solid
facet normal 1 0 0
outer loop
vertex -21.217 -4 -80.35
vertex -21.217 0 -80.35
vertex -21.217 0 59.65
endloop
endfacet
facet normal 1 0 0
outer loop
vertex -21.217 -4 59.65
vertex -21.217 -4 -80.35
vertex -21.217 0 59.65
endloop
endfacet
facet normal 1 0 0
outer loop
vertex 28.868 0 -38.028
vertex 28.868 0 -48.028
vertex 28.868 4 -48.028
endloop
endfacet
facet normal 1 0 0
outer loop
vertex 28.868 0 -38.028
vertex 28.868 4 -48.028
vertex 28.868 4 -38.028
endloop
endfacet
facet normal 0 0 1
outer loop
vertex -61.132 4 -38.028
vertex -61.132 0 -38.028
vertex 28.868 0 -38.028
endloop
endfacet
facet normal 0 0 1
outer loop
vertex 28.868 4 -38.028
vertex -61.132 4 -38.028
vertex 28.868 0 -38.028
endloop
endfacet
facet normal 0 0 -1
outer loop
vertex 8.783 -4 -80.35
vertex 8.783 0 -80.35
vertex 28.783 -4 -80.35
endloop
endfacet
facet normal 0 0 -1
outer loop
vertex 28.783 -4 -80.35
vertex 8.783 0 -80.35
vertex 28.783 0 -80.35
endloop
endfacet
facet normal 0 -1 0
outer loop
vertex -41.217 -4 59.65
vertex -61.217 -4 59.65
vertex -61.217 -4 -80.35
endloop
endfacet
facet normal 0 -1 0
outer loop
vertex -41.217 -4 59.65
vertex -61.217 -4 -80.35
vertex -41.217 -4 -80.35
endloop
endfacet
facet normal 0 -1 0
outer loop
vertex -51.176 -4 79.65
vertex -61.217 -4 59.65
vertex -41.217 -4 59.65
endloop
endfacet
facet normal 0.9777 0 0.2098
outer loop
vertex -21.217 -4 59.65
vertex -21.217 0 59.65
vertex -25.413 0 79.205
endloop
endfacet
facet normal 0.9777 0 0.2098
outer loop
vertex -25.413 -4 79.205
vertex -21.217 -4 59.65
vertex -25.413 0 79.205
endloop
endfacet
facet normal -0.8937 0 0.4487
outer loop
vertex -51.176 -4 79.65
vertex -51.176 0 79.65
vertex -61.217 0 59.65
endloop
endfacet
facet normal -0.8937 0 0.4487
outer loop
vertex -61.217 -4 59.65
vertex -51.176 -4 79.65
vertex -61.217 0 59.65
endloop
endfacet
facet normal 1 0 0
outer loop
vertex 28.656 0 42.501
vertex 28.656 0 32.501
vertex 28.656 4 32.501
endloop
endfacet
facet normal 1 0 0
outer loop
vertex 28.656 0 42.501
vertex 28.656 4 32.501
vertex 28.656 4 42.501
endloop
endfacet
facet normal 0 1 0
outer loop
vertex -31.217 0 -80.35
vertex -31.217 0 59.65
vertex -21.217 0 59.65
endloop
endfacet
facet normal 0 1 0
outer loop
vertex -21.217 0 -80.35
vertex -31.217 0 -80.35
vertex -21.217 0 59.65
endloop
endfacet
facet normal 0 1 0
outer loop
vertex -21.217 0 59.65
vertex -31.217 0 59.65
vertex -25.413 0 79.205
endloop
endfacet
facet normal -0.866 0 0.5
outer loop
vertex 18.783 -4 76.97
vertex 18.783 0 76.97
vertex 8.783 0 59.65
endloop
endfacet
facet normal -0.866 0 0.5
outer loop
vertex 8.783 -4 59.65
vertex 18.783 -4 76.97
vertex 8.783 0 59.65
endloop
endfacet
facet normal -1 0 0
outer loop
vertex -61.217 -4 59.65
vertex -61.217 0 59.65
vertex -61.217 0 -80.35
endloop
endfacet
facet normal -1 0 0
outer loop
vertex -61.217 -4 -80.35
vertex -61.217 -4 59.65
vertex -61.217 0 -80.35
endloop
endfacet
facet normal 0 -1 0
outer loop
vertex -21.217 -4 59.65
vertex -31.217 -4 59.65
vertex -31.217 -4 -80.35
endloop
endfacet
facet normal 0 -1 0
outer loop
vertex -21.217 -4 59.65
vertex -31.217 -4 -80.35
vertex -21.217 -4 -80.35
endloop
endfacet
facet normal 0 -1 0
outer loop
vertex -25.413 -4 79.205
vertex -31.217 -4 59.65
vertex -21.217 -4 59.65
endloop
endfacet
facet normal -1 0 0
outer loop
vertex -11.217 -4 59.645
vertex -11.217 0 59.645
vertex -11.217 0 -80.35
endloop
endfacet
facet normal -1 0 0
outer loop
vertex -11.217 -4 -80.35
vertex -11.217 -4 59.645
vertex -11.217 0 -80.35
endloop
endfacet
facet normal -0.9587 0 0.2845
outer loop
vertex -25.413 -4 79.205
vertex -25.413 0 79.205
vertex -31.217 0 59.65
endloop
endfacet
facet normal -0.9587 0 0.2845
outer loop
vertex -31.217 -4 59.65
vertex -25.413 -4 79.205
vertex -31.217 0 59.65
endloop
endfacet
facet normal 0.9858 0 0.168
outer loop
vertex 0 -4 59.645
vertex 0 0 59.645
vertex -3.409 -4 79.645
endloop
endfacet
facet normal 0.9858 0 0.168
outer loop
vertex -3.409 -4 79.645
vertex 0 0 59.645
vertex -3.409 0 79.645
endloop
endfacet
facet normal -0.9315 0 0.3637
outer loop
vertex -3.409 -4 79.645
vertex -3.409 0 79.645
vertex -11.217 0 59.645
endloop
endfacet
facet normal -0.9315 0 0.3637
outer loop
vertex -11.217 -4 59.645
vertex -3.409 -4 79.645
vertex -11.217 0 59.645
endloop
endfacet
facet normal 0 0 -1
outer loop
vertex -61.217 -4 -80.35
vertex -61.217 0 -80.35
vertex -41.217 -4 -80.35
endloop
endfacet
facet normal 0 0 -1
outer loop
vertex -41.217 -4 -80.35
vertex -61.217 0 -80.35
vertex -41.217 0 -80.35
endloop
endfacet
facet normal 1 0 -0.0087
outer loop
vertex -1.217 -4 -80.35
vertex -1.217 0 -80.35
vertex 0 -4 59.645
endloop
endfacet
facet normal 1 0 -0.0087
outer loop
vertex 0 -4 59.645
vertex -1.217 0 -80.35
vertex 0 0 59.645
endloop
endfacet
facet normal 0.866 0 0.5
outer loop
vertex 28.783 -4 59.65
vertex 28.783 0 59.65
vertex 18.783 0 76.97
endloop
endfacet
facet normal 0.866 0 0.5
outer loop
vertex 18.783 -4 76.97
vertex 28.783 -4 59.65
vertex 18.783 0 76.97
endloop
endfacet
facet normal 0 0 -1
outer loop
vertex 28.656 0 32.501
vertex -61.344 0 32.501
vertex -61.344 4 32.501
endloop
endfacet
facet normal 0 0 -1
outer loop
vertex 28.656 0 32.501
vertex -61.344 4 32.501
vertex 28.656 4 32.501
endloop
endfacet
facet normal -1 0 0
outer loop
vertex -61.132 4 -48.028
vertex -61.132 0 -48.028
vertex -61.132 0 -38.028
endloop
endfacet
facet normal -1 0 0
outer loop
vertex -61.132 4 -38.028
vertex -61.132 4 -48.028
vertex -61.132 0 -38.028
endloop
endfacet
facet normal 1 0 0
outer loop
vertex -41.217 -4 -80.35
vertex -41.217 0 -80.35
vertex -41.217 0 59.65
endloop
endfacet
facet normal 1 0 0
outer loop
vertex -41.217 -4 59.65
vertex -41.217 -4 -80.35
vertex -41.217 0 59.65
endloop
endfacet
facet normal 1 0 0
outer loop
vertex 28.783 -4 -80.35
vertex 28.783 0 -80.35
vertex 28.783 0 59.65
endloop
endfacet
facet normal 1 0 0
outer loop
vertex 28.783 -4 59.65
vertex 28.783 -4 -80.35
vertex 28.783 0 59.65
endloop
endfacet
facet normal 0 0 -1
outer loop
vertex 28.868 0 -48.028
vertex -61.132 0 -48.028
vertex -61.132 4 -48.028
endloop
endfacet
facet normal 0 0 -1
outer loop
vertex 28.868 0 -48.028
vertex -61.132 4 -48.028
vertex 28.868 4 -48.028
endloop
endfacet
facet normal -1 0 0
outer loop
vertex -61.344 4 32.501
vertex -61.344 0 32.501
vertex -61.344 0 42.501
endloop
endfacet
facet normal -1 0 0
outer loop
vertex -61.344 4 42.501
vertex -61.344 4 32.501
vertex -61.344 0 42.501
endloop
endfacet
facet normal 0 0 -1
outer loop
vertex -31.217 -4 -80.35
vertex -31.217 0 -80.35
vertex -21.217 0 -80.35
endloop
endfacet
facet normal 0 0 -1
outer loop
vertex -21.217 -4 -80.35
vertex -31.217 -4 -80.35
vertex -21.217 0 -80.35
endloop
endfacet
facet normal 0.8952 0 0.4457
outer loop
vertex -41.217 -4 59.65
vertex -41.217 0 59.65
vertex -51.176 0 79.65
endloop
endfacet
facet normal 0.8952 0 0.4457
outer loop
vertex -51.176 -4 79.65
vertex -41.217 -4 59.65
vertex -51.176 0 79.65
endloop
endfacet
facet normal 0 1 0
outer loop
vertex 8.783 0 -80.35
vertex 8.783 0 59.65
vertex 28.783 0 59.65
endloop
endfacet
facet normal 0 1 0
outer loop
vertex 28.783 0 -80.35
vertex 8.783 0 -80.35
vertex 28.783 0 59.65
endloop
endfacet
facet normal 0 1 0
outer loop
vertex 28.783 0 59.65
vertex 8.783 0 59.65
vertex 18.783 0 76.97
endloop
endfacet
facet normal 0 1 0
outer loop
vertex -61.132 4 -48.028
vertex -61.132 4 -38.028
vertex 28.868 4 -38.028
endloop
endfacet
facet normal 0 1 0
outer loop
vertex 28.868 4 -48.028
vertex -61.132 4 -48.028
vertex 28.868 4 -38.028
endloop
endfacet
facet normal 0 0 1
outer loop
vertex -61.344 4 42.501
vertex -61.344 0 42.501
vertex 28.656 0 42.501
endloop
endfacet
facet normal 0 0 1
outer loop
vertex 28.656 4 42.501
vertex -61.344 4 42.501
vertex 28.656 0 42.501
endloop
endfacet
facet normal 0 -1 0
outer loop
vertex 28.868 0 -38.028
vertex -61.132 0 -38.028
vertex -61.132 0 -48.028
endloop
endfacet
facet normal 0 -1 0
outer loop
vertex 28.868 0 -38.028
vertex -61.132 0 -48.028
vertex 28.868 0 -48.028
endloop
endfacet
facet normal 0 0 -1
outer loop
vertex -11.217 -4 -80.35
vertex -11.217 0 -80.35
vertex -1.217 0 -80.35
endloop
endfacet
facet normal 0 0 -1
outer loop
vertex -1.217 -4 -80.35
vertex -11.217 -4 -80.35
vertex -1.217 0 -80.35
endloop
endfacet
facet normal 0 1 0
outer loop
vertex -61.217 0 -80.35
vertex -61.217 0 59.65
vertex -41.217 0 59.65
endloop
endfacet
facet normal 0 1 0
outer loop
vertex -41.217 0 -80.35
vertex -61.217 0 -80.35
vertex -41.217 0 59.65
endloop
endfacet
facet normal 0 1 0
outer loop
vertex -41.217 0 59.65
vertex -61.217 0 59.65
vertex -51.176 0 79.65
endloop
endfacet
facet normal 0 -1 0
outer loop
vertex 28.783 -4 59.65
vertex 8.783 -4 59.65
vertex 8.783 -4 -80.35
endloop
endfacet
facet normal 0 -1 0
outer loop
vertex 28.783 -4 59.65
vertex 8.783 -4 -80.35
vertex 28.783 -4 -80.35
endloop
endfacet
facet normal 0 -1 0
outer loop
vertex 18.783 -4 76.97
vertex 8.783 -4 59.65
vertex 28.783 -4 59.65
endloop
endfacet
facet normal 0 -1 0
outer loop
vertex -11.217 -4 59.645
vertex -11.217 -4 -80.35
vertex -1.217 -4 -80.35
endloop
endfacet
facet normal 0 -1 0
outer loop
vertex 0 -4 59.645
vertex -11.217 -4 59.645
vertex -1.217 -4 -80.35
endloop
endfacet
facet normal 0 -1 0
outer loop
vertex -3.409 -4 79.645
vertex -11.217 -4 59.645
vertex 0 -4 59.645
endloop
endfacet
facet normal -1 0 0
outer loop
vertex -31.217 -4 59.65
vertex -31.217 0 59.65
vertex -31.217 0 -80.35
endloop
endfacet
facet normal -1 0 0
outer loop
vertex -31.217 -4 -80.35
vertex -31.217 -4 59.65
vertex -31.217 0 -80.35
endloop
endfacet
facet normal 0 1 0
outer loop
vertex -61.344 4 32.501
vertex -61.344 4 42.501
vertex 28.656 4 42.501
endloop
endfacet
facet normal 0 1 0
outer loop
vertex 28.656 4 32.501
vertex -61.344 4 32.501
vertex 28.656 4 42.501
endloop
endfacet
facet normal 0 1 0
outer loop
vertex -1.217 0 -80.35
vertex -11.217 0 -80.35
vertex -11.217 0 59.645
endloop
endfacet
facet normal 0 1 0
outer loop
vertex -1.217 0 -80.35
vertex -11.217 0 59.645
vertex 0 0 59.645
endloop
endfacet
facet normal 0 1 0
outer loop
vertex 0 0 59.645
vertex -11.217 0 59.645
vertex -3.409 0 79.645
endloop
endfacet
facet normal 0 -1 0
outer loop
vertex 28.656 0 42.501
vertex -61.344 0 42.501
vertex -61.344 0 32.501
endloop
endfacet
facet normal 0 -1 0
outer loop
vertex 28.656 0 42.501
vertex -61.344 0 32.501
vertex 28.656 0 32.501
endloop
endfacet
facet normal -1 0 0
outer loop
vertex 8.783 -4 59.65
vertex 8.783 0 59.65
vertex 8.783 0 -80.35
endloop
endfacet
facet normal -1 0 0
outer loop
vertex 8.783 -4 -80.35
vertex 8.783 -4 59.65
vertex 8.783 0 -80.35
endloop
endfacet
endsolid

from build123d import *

# Parameters (mm, degrees)
F1_DEPTH = 4
F2_W     = 90
F2_H     = 10
F3_DEPTH = 4
F4_W     = 90
F4_H     = 10
F5_DEPTH = 4


with BuildPart() as f1:
    # F0 (on Front) → F1 (new body)
    with BuildSketch(Plane.XZ):
        Polygon((8.782633, 59.649963), (8.782633, -80.350037), (28.782633, -80.350037), (28.782633, 59.649963), (18.782633, 59.649963), align=None)
        Polygon((-11.217367, 59.64467), (-11.217367, -80.350037), (-1.217367, -80.350037), (0, 59.64467), (-5.608683, 59.64467), align=None)
        Polygon((-51.175786, 59.649963), (-61.217367, 59.649963), (-61.217367, -80.350037), (-41.217367, -80.350037), (-41.217367, 59.649963), align=None)
        Polygon((-31.217367, 59.649963), (-31.217367, -80.350037), (-21.217367, -80.350037), (-21.217367, 59.649963), (-26.200101, 59.649963), align=None)
        Polygon((18.782633, 59.649963), (28.782633, 59.649963), (18.782633, 76.970471), align=None)
        Polygon((18.782633, 76.970471), (8.782633, 59.649963), (18.782633, 59.649963), align=None)
        Polygon((-3.408567, 79.64467), (-11.217367, 59.64467), (-5.608683, 59.64467), align=None)
        Polygon((-25.412619, 79.20501), (-31.217367, 59.649963), (-26.200101, 59.649963), align=None)
        Polygon((-51.175786, 79.649963), (-61.217367, 59.649963), (-51.175786, 59.649963), align=None)
        Polygon((-41.217367, 59.649963), (-51.175786, 79.649963), (-51.175786, 59.649963), align=None)
        Polygon((-26.200101, 59.649963), (-21.217367, 59.649963), (-25.412619, 79.20501), align=None)
        Polygon((-5.608683, 59.64467), (0, 59.64467), (-3.408567, 79.64467), align=None)
    extrude(amount=F1_DEPTH)


with BuildPart() as f3:
    # F2 (on Front) → F3 (new body)
    with BuildSketch(Plane.XZ):
        with Locations((-16.344065, 37.501103)):
            Rectangle(F2_W, F2_H)
    extrude(amount=-F3_DEPTH)


with BuildPart() as f5:
    # F4 (on Front) → F5 (new body)
    with BuildSketch(Plane.XZ):
        with Locations((-16.131684, -43.027853)):
            Rectangle(F4_W, F4_H)
    extrude(amount=-F5_DEPTH)


solid = Compound([f1.part, f3.part, f5.part])
